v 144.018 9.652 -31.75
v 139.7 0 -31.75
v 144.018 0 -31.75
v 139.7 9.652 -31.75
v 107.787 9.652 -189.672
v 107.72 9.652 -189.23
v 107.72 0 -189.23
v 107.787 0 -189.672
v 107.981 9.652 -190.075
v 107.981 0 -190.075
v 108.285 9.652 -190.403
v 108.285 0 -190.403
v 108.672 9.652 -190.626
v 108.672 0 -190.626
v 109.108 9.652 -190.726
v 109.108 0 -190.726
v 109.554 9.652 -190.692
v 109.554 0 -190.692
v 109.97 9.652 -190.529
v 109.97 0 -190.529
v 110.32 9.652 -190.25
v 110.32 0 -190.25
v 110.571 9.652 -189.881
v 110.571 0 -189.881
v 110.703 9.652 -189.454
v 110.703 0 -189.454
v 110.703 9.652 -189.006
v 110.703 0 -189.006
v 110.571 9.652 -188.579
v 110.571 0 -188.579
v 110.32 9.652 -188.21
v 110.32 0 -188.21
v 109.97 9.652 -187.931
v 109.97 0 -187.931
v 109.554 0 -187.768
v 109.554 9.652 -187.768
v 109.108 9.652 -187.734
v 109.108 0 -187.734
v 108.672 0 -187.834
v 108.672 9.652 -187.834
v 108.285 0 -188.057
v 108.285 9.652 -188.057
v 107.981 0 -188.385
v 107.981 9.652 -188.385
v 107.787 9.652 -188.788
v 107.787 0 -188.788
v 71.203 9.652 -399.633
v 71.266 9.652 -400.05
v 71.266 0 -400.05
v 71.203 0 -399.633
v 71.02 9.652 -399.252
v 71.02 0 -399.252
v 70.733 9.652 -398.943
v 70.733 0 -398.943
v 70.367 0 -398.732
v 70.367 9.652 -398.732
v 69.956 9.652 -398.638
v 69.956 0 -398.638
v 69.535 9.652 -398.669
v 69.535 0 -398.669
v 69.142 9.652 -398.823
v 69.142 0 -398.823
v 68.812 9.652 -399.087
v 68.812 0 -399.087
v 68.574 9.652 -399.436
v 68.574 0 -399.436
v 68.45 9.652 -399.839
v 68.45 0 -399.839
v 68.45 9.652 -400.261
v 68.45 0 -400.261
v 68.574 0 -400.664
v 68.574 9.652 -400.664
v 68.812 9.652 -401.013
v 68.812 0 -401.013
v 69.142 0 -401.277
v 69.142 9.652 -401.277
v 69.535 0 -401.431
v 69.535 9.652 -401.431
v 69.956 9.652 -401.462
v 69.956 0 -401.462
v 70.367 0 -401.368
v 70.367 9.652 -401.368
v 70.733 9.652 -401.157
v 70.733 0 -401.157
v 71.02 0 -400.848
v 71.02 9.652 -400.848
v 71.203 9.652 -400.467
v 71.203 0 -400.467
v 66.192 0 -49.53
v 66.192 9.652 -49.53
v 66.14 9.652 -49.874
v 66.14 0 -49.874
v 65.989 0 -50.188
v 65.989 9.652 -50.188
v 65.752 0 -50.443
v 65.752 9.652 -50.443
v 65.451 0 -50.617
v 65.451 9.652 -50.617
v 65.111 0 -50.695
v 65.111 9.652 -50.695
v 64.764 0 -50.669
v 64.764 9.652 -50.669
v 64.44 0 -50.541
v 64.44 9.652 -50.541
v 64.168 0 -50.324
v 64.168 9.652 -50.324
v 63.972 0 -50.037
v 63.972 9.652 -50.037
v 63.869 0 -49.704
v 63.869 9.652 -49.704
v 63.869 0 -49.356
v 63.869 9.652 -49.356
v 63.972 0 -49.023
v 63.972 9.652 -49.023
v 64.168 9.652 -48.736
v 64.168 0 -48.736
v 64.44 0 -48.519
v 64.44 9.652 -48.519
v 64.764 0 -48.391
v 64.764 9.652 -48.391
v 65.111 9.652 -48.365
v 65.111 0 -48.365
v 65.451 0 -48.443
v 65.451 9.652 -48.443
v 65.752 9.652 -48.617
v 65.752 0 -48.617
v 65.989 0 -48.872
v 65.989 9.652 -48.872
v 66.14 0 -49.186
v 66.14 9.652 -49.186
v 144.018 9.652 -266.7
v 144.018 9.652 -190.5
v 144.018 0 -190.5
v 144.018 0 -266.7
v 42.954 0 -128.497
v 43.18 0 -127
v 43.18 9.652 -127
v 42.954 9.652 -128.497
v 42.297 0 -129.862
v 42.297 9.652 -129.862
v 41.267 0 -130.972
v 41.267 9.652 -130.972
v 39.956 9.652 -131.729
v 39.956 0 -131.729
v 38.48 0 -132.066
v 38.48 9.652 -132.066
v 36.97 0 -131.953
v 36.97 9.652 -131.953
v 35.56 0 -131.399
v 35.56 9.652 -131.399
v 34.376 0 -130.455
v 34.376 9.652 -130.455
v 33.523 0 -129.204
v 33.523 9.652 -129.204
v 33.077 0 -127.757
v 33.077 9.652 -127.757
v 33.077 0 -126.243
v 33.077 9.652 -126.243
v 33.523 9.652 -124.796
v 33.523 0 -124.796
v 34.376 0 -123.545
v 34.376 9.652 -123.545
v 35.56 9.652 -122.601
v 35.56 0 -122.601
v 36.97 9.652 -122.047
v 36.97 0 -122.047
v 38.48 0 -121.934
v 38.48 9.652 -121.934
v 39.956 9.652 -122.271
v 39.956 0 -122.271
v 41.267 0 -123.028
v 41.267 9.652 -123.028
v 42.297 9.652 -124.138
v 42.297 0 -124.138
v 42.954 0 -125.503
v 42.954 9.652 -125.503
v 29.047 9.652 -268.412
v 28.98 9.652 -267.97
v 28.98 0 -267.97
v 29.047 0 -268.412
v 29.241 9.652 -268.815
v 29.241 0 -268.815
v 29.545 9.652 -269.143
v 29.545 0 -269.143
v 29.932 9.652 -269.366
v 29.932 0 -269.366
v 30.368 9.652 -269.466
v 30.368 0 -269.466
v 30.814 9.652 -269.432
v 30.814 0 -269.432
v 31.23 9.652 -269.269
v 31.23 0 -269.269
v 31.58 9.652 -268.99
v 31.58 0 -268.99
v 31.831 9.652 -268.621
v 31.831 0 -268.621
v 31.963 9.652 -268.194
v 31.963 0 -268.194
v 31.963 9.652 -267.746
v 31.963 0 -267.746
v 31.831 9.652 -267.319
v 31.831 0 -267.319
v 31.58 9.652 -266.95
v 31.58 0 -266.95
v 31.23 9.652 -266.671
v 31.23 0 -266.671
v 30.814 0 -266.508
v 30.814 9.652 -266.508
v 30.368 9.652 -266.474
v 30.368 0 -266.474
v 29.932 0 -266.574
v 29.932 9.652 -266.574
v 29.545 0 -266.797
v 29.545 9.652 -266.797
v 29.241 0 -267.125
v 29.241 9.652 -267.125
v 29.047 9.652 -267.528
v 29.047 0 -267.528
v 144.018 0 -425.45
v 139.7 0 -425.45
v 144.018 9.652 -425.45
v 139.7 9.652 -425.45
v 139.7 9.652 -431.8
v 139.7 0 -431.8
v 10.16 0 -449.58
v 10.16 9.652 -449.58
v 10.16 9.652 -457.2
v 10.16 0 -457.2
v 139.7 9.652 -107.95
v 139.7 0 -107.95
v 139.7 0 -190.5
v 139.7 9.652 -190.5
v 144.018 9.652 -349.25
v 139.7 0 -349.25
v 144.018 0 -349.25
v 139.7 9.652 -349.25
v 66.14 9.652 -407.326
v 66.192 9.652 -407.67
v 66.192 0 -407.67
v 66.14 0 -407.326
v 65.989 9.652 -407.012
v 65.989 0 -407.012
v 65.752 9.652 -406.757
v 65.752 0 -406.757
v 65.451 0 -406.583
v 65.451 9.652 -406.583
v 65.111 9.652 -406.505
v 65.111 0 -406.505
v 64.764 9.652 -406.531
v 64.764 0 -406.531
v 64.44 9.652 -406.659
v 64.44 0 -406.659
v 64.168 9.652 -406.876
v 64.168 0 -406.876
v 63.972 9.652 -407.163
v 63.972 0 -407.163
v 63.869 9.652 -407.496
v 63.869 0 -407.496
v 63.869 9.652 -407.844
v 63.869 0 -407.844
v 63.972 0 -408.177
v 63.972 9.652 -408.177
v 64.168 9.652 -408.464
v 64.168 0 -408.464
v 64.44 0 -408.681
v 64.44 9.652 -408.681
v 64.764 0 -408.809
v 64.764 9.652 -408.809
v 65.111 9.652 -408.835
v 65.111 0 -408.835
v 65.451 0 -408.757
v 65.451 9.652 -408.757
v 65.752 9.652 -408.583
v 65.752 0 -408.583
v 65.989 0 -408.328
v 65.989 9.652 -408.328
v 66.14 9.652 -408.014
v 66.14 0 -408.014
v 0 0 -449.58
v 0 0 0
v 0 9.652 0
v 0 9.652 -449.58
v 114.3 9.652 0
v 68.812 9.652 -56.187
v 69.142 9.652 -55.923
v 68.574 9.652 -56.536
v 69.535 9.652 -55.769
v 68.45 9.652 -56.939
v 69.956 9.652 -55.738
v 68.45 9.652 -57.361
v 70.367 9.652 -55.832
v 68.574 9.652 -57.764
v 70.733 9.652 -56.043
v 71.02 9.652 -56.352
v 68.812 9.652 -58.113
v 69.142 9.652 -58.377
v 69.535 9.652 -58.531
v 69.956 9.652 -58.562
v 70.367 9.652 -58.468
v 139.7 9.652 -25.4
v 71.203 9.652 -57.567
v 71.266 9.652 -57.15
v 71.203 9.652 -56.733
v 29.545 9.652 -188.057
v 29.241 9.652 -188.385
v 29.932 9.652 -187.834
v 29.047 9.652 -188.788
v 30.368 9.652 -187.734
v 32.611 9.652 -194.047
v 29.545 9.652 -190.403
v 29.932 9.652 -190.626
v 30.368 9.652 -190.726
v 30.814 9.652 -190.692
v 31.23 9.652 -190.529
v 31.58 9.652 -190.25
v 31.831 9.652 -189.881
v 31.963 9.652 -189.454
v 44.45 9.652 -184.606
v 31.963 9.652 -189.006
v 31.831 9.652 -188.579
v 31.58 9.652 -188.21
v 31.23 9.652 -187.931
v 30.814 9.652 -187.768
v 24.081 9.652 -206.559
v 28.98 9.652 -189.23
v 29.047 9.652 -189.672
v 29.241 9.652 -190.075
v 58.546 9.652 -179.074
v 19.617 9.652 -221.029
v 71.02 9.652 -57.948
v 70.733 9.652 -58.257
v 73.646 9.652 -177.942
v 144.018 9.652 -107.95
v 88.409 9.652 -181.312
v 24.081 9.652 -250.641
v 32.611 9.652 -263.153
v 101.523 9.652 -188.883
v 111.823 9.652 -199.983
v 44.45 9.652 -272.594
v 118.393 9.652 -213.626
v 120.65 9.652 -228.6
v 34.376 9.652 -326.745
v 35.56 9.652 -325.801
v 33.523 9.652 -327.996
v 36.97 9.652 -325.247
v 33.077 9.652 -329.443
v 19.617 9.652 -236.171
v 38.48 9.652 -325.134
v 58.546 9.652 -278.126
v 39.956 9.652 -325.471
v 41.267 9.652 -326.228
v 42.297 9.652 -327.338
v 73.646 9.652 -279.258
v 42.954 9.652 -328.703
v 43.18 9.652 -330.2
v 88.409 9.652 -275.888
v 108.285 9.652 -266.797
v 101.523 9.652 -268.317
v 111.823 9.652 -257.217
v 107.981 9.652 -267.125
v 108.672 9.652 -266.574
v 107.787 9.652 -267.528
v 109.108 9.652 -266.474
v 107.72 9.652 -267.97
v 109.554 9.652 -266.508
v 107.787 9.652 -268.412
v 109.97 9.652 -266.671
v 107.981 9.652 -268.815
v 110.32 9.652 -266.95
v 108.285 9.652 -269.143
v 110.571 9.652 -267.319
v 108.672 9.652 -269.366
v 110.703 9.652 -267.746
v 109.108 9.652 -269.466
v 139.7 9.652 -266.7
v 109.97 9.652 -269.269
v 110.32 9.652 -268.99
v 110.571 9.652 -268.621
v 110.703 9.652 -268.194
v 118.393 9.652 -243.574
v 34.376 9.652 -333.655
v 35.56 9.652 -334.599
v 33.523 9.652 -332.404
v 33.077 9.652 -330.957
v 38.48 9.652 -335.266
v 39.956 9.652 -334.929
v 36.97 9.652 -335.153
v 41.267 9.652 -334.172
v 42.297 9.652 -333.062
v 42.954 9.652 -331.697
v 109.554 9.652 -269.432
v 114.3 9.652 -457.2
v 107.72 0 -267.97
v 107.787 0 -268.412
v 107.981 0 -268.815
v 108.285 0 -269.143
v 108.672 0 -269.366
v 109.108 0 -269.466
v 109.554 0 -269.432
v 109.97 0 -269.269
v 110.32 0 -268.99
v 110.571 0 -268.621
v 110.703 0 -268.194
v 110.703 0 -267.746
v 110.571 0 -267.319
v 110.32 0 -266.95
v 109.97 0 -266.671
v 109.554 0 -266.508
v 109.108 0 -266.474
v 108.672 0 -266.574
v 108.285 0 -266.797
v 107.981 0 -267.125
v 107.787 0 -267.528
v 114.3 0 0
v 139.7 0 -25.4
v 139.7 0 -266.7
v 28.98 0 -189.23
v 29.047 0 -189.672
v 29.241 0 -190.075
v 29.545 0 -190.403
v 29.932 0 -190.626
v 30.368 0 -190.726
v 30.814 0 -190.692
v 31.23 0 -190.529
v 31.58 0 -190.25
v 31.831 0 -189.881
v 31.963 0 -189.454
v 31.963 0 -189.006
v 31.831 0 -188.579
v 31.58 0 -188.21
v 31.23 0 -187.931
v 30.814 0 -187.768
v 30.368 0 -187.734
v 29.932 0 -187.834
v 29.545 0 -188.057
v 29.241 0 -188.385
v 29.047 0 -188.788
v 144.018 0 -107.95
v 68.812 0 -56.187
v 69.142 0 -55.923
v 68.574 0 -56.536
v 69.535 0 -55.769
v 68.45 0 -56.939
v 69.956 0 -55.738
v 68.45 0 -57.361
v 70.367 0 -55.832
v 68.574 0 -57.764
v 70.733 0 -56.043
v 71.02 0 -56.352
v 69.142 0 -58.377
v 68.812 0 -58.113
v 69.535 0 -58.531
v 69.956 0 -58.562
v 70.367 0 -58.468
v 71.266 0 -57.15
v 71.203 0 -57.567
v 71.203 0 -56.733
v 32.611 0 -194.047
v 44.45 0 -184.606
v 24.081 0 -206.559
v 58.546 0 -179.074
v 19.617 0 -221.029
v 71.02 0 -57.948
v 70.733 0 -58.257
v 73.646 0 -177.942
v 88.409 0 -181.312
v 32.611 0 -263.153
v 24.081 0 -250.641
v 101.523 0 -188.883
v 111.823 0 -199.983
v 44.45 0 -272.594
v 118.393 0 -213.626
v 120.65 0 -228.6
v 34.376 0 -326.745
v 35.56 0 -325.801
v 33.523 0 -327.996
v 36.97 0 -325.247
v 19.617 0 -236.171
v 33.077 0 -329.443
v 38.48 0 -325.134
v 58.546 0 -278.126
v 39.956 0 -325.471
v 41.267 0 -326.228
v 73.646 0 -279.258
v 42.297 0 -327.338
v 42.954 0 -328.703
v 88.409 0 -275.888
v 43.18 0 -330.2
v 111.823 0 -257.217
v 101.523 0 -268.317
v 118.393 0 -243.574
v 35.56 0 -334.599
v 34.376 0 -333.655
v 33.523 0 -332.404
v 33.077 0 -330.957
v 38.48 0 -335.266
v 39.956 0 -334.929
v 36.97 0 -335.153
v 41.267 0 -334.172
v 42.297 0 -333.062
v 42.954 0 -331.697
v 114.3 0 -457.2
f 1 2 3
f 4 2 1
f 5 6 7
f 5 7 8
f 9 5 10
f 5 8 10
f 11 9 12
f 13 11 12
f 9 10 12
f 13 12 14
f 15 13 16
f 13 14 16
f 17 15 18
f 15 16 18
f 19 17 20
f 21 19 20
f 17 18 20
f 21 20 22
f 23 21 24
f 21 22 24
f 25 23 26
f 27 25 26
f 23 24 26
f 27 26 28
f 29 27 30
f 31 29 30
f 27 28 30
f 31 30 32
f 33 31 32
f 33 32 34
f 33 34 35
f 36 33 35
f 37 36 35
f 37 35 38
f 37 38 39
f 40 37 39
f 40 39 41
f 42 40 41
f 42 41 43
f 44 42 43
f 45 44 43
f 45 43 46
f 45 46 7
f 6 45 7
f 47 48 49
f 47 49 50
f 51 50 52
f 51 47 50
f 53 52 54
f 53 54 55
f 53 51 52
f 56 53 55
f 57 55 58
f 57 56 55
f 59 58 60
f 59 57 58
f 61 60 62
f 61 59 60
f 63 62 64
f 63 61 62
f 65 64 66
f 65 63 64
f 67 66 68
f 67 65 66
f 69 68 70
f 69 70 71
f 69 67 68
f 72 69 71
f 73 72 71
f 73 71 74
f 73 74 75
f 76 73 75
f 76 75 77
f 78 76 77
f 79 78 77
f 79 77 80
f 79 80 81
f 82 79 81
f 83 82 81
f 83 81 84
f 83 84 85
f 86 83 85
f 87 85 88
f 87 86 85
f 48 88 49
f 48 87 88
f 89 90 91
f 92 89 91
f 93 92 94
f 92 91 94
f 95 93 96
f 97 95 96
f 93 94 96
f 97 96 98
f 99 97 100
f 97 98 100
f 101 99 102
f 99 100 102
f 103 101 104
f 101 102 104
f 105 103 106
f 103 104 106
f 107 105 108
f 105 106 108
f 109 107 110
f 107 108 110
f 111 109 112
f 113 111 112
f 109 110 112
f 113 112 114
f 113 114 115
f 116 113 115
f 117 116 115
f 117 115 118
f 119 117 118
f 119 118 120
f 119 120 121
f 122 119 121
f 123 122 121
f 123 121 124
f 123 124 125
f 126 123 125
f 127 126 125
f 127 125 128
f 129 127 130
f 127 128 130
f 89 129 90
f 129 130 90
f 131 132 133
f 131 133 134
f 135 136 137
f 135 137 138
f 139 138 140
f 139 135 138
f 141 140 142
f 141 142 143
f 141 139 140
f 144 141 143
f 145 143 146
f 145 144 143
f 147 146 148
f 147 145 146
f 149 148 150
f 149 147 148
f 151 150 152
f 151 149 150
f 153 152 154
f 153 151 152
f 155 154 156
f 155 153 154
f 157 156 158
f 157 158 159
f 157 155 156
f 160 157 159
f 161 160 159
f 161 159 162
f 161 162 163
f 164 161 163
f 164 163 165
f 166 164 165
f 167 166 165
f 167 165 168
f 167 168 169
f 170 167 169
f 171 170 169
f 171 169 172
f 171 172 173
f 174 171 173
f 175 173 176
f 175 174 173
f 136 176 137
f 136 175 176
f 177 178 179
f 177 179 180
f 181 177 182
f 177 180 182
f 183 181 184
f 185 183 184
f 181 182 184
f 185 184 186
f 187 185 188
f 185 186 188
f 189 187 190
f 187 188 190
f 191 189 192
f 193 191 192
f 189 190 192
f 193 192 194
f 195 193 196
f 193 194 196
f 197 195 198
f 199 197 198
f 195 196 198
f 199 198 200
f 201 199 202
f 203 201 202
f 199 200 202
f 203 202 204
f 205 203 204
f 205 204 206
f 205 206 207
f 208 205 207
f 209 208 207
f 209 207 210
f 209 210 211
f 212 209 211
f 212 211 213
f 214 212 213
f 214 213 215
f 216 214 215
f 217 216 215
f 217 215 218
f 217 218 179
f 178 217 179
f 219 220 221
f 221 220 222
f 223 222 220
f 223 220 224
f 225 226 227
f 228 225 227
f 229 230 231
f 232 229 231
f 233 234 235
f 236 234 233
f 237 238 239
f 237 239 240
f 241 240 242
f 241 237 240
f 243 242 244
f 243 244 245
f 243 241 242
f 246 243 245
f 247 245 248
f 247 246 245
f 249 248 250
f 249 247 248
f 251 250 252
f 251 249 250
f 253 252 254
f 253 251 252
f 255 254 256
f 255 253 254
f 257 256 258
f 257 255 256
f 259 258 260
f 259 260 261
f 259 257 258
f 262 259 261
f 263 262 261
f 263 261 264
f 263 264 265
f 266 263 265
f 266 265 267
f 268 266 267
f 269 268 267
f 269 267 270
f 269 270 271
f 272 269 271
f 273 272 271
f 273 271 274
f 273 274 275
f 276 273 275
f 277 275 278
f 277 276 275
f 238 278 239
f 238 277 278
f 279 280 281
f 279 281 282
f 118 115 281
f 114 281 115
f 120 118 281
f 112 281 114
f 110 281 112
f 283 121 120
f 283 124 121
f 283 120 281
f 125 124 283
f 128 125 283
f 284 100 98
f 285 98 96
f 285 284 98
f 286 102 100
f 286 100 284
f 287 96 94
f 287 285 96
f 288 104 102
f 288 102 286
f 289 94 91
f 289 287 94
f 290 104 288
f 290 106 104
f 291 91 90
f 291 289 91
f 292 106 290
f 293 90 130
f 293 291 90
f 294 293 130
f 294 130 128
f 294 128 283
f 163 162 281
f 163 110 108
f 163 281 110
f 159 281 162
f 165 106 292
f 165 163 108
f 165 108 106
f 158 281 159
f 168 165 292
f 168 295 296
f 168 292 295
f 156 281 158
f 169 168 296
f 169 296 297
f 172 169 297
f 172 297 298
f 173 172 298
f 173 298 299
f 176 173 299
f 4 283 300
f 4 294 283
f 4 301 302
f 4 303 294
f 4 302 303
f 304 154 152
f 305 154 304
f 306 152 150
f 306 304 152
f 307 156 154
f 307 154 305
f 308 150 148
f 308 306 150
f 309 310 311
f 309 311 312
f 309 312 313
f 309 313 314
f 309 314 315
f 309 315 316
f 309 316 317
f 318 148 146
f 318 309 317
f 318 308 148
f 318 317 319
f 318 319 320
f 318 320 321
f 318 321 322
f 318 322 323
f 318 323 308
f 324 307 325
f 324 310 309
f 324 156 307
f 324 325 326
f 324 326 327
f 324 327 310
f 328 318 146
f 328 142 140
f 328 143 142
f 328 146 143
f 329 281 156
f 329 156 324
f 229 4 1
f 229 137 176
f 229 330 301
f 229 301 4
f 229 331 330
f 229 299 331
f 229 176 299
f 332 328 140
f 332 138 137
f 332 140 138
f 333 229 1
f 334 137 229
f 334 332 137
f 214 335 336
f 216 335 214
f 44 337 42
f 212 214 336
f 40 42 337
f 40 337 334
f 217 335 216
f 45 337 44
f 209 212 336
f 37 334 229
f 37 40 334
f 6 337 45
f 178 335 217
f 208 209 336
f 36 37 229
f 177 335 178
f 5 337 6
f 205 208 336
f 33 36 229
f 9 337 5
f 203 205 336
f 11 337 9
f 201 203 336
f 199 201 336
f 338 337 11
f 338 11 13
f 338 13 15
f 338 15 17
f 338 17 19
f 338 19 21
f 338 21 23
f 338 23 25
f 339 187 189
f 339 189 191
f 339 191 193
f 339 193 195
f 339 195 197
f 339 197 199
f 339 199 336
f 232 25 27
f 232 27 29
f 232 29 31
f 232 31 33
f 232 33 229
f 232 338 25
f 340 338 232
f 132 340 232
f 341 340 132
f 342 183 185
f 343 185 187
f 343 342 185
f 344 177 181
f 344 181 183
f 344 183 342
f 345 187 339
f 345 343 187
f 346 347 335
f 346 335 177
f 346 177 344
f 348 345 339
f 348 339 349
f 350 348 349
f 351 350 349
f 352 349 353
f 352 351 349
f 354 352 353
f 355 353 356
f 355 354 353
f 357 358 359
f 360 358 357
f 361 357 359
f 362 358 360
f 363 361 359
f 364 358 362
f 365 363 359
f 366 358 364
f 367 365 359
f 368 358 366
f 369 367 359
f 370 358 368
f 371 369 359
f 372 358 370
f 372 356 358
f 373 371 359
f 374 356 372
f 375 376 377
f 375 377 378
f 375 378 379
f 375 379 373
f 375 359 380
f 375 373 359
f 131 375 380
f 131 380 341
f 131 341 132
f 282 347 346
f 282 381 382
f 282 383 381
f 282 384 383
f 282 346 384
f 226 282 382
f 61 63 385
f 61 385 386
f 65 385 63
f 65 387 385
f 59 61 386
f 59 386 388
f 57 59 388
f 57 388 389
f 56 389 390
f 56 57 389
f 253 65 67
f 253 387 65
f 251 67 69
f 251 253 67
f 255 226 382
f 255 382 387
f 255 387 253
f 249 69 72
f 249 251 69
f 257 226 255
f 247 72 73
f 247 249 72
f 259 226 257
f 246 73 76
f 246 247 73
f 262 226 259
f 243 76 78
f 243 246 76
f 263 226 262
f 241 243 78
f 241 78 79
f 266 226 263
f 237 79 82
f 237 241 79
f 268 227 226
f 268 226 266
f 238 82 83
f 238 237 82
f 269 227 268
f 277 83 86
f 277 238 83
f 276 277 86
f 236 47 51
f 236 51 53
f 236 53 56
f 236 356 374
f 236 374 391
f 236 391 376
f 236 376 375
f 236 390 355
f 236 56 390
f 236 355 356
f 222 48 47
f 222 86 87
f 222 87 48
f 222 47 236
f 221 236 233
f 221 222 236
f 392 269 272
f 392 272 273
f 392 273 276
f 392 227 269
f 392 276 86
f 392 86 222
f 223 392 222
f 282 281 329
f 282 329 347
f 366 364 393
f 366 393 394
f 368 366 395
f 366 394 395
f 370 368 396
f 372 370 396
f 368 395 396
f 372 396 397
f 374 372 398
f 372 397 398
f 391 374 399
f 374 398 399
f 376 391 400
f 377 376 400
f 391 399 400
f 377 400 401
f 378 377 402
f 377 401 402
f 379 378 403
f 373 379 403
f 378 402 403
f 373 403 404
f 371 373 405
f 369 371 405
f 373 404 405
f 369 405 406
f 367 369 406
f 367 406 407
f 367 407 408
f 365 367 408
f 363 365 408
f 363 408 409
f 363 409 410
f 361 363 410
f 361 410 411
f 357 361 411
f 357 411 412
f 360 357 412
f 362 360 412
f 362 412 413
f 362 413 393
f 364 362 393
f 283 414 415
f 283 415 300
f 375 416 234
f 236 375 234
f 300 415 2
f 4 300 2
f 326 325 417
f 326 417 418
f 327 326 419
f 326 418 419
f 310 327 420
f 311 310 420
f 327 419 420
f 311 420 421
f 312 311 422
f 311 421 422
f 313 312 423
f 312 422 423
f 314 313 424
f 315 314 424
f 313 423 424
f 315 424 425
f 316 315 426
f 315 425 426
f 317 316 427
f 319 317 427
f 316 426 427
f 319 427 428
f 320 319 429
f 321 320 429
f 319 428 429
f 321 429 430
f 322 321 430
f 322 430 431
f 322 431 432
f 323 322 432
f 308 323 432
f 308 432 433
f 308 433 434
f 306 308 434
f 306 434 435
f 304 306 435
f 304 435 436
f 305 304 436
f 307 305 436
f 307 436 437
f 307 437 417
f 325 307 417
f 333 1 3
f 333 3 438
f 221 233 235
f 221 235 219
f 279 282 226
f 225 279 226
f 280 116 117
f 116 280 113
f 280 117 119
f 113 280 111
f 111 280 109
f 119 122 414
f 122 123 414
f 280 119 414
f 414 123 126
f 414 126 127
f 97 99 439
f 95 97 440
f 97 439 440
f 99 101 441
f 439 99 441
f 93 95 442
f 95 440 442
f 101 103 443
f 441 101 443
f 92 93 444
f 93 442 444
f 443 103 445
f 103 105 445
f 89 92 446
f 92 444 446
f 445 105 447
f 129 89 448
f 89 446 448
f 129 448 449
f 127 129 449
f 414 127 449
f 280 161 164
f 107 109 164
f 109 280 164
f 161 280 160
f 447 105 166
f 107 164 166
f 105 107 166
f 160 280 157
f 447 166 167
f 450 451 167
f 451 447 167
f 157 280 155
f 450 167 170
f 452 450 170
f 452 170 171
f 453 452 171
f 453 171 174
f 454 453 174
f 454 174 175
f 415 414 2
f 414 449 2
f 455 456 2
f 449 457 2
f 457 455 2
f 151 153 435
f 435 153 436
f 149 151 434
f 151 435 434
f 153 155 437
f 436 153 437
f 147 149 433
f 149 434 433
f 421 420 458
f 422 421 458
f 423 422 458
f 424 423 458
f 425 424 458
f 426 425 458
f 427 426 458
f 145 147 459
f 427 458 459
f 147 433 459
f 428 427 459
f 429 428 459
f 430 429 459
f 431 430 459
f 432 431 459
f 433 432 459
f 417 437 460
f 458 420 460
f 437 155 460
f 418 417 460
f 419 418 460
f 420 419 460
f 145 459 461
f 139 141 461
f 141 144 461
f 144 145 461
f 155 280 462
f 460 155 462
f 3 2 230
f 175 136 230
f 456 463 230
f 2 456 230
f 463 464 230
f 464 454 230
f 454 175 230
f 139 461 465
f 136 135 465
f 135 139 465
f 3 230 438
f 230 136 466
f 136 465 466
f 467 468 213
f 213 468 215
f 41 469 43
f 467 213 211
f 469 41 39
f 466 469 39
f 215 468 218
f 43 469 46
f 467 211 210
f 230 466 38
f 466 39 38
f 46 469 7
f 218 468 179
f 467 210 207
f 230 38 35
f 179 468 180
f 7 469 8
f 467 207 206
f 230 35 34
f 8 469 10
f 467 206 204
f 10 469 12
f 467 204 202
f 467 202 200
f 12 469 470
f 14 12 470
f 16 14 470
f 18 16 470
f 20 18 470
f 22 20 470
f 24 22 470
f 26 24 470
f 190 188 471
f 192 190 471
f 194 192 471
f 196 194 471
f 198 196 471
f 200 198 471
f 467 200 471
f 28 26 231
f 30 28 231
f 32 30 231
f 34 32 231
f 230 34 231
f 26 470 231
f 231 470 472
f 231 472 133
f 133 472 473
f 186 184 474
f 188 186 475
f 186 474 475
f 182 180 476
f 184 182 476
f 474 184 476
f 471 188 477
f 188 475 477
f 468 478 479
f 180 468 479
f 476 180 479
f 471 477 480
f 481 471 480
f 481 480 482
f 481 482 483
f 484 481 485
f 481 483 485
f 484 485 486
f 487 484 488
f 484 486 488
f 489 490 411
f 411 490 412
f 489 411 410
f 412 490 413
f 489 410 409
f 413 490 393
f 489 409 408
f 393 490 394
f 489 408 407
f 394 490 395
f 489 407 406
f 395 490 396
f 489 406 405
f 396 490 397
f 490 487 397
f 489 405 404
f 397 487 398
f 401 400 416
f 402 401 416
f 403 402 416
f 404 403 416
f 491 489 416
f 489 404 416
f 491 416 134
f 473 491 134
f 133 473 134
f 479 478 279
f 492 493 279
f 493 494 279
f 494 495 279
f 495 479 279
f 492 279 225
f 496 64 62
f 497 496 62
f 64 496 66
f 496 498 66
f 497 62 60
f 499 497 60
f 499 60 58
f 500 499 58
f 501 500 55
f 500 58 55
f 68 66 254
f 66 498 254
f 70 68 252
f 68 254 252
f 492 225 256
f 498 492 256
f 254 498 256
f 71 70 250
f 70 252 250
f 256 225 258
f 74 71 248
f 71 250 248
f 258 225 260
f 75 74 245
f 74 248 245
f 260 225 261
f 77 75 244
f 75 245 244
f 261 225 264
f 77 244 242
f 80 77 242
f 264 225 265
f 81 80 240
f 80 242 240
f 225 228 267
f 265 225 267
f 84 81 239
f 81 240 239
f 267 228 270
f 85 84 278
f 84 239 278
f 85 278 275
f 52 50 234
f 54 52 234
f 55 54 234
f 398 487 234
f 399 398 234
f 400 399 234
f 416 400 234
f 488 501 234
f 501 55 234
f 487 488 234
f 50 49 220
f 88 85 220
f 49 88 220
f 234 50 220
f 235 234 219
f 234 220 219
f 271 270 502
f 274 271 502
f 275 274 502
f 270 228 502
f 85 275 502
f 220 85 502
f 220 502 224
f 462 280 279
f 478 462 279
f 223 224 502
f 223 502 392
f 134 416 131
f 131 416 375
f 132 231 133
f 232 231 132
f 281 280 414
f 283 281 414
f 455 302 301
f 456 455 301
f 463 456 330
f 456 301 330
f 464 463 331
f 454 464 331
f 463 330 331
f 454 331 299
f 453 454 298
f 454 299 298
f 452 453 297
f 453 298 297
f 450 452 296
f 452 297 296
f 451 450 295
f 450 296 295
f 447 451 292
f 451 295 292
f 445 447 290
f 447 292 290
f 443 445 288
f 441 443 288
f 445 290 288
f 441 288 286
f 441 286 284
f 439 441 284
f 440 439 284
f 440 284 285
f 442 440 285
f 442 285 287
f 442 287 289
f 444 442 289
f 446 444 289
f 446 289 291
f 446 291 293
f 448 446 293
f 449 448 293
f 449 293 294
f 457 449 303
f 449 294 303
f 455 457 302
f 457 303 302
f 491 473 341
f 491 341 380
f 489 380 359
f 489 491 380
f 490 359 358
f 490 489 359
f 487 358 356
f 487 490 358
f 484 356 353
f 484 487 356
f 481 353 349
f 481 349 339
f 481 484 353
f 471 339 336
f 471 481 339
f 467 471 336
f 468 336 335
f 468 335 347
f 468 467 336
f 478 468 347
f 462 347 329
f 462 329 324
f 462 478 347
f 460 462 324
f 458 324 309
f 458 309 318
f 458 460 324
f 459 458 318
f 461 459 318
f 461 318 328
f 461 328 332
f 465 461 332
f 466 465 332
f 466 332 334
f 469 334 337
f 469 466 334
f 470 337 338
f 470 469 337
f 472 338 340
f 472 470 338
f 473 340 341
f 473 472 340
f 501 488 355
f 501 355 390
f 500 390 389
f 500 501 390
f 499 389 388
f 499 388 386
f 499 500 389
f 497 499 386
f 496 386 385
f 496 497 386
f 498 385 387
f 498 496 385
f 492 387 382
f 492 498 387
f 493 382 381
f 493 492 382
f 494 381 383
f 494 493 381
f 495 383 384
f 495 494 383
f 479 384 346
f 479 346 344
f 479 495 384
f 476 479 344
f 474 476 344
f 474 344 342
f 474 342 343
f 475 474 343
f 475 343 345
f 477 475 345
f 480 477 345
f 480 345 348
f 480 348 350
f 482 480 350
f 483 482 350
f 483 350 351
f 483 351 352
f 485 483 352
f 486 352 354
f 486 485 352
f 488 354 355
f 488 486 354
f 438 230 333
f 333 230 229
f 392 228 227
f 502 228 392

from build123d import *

# Parameters (mm, degrees)
SKETCH1_W                    = 139.7
SKETCH1_H                    = 457.2
SKETCH1_R                    = 50.8
SKETCH1_R_2                  = 5.08
BOSS_EXTRUDE1_DEPTH          = 9.652
SKETCH4_W                    = 10.16
SKETCH4_H                    = 7.62
CUT_EXTRUDE1_DEPTH           = 10.652
CHAMFER1_SIZE                = 25.4
SKETCH5_W                    = 76.2
SKETCH5_H                    = 9.652
BOSS_EXTRUDE2_DEPTH          = 4.318
F_3_0_3_DIAMETER_HOLE1_D     = 3
F_3_0_3_DIAMETER_HOLE1_DEPTH = 9.652
SKETCH10_R                   = 1.167867484
SKETCH10_R_2                 = 1.416247351
CUT_EXTRUDE2_DEPTH           = 9.652


with BuildPart() as part:
    # Sketch1 → Boss-Extrude1 (new body)
    with BuildSketch(Plane(origin=(0, 0, 0), x_dir=(1, 0, 0), z_dir=(0, 1, 0))):
        with Locations((69.85, 228.6)):
            Rectangle(SKETCH1_W, SKETCH1_H)
        with Locations((69.85, 228.6)):
            Circle(SKETCH1_R, mode=Mode.SUBTRACT)
        with Locations((38.1, 127)):
            Circle(SKETCH1_R_2, mode=Mode.SUBTRACT)
        with Locations((38.1, 330.2)):
            Circle(SKETCH1_R_2, mode=Mode.SUBTRACT)
    extrude(amount=BOSS_EXTRUDE1_DEPTH)

    # Sketch4 → Cut-Extrude1 (cut, through all)
    with BuildSketch(Plane(origin=(0, 9.652, 0), x_dir=(1, 0, 0), z_dir=(0, 1, 0))):
        with Locations((5.08, 453.39)):
            Rectangle(SKETCH4_W, SKETCH4_H)
    extrude(amount=-CUT_EXTRUDE1_DEPTH, mode=Mode.SUBTRACT)

    # Chamfer1
    chamfer1_edges = [part.edges().sort_by_distance(p)[0] for p in [
        (139.7, 4.826, -457.2),
        (139.7, 4.826, 0),
    ]]
    chamfer(chamfer1_edges, length=CHAMFER1_SIZE)

    # Sketch5 → Boss-Extrude2 (add)
    with BuildSketch(Plane(origin=(139.7, 0, 0), x_dir=(0, 0, -1), z_dir=(1, 0, 0))):
        with Locations((69.85, 4.826)):
            Rectangle(SKETCH5_W, SKETCH5_H)
        with Locations((228.6, 4.826)):
            Rectangle(SKETCH5_W, SKETCH5_H)
        with Locations((387.35, 4.826)):
            Rectangle(SKETCH5_W, SKETCH5_H)
    extrude(amount=BOSS_EXTRUDE2_DEPTH)

    # Ø3.0 (3) Diameter Hole1
    with Locations(Plane(origin=(0, 9.652, 0), x_dir=(1, 0, 0), z_dir=(0, 1, 0))):
        with Locations((109.22, 189.23), (30.48, 189.23), (30.48, 267.97), (109.22, 267.97)):
            Hole(F_3_0_3_DIAMETER_HOLE1_D / 2, depth=F_3_0_3_DIAMETER_HOLE1_DEPTH)

    # Sketch10 → Cut-Extrude2 (cut)
    with BuildSketch(Plane(origin=(0, 9.652, 0), x_dir=(1, 0, 0), z_dir=(0, 1, 0))):
        with Locations((65.024, 49.53)):
            Circle(SKETCH10_R)
        with Locations((69.85, 57.15)):
            Circle(SKETCH10_R_2)
    cut_extrude2 = extrude(amount=-CUT_EXTRUDE2_DEPTH, mode=Mode.SUBTRACT)

    # Mirror1: Cut-Extrude2 across plane
    add(cut_extrude2.mirror(Plane.XY.offset(-228.6)), mode=Mode.SUBTRACT)


solid = part.part
